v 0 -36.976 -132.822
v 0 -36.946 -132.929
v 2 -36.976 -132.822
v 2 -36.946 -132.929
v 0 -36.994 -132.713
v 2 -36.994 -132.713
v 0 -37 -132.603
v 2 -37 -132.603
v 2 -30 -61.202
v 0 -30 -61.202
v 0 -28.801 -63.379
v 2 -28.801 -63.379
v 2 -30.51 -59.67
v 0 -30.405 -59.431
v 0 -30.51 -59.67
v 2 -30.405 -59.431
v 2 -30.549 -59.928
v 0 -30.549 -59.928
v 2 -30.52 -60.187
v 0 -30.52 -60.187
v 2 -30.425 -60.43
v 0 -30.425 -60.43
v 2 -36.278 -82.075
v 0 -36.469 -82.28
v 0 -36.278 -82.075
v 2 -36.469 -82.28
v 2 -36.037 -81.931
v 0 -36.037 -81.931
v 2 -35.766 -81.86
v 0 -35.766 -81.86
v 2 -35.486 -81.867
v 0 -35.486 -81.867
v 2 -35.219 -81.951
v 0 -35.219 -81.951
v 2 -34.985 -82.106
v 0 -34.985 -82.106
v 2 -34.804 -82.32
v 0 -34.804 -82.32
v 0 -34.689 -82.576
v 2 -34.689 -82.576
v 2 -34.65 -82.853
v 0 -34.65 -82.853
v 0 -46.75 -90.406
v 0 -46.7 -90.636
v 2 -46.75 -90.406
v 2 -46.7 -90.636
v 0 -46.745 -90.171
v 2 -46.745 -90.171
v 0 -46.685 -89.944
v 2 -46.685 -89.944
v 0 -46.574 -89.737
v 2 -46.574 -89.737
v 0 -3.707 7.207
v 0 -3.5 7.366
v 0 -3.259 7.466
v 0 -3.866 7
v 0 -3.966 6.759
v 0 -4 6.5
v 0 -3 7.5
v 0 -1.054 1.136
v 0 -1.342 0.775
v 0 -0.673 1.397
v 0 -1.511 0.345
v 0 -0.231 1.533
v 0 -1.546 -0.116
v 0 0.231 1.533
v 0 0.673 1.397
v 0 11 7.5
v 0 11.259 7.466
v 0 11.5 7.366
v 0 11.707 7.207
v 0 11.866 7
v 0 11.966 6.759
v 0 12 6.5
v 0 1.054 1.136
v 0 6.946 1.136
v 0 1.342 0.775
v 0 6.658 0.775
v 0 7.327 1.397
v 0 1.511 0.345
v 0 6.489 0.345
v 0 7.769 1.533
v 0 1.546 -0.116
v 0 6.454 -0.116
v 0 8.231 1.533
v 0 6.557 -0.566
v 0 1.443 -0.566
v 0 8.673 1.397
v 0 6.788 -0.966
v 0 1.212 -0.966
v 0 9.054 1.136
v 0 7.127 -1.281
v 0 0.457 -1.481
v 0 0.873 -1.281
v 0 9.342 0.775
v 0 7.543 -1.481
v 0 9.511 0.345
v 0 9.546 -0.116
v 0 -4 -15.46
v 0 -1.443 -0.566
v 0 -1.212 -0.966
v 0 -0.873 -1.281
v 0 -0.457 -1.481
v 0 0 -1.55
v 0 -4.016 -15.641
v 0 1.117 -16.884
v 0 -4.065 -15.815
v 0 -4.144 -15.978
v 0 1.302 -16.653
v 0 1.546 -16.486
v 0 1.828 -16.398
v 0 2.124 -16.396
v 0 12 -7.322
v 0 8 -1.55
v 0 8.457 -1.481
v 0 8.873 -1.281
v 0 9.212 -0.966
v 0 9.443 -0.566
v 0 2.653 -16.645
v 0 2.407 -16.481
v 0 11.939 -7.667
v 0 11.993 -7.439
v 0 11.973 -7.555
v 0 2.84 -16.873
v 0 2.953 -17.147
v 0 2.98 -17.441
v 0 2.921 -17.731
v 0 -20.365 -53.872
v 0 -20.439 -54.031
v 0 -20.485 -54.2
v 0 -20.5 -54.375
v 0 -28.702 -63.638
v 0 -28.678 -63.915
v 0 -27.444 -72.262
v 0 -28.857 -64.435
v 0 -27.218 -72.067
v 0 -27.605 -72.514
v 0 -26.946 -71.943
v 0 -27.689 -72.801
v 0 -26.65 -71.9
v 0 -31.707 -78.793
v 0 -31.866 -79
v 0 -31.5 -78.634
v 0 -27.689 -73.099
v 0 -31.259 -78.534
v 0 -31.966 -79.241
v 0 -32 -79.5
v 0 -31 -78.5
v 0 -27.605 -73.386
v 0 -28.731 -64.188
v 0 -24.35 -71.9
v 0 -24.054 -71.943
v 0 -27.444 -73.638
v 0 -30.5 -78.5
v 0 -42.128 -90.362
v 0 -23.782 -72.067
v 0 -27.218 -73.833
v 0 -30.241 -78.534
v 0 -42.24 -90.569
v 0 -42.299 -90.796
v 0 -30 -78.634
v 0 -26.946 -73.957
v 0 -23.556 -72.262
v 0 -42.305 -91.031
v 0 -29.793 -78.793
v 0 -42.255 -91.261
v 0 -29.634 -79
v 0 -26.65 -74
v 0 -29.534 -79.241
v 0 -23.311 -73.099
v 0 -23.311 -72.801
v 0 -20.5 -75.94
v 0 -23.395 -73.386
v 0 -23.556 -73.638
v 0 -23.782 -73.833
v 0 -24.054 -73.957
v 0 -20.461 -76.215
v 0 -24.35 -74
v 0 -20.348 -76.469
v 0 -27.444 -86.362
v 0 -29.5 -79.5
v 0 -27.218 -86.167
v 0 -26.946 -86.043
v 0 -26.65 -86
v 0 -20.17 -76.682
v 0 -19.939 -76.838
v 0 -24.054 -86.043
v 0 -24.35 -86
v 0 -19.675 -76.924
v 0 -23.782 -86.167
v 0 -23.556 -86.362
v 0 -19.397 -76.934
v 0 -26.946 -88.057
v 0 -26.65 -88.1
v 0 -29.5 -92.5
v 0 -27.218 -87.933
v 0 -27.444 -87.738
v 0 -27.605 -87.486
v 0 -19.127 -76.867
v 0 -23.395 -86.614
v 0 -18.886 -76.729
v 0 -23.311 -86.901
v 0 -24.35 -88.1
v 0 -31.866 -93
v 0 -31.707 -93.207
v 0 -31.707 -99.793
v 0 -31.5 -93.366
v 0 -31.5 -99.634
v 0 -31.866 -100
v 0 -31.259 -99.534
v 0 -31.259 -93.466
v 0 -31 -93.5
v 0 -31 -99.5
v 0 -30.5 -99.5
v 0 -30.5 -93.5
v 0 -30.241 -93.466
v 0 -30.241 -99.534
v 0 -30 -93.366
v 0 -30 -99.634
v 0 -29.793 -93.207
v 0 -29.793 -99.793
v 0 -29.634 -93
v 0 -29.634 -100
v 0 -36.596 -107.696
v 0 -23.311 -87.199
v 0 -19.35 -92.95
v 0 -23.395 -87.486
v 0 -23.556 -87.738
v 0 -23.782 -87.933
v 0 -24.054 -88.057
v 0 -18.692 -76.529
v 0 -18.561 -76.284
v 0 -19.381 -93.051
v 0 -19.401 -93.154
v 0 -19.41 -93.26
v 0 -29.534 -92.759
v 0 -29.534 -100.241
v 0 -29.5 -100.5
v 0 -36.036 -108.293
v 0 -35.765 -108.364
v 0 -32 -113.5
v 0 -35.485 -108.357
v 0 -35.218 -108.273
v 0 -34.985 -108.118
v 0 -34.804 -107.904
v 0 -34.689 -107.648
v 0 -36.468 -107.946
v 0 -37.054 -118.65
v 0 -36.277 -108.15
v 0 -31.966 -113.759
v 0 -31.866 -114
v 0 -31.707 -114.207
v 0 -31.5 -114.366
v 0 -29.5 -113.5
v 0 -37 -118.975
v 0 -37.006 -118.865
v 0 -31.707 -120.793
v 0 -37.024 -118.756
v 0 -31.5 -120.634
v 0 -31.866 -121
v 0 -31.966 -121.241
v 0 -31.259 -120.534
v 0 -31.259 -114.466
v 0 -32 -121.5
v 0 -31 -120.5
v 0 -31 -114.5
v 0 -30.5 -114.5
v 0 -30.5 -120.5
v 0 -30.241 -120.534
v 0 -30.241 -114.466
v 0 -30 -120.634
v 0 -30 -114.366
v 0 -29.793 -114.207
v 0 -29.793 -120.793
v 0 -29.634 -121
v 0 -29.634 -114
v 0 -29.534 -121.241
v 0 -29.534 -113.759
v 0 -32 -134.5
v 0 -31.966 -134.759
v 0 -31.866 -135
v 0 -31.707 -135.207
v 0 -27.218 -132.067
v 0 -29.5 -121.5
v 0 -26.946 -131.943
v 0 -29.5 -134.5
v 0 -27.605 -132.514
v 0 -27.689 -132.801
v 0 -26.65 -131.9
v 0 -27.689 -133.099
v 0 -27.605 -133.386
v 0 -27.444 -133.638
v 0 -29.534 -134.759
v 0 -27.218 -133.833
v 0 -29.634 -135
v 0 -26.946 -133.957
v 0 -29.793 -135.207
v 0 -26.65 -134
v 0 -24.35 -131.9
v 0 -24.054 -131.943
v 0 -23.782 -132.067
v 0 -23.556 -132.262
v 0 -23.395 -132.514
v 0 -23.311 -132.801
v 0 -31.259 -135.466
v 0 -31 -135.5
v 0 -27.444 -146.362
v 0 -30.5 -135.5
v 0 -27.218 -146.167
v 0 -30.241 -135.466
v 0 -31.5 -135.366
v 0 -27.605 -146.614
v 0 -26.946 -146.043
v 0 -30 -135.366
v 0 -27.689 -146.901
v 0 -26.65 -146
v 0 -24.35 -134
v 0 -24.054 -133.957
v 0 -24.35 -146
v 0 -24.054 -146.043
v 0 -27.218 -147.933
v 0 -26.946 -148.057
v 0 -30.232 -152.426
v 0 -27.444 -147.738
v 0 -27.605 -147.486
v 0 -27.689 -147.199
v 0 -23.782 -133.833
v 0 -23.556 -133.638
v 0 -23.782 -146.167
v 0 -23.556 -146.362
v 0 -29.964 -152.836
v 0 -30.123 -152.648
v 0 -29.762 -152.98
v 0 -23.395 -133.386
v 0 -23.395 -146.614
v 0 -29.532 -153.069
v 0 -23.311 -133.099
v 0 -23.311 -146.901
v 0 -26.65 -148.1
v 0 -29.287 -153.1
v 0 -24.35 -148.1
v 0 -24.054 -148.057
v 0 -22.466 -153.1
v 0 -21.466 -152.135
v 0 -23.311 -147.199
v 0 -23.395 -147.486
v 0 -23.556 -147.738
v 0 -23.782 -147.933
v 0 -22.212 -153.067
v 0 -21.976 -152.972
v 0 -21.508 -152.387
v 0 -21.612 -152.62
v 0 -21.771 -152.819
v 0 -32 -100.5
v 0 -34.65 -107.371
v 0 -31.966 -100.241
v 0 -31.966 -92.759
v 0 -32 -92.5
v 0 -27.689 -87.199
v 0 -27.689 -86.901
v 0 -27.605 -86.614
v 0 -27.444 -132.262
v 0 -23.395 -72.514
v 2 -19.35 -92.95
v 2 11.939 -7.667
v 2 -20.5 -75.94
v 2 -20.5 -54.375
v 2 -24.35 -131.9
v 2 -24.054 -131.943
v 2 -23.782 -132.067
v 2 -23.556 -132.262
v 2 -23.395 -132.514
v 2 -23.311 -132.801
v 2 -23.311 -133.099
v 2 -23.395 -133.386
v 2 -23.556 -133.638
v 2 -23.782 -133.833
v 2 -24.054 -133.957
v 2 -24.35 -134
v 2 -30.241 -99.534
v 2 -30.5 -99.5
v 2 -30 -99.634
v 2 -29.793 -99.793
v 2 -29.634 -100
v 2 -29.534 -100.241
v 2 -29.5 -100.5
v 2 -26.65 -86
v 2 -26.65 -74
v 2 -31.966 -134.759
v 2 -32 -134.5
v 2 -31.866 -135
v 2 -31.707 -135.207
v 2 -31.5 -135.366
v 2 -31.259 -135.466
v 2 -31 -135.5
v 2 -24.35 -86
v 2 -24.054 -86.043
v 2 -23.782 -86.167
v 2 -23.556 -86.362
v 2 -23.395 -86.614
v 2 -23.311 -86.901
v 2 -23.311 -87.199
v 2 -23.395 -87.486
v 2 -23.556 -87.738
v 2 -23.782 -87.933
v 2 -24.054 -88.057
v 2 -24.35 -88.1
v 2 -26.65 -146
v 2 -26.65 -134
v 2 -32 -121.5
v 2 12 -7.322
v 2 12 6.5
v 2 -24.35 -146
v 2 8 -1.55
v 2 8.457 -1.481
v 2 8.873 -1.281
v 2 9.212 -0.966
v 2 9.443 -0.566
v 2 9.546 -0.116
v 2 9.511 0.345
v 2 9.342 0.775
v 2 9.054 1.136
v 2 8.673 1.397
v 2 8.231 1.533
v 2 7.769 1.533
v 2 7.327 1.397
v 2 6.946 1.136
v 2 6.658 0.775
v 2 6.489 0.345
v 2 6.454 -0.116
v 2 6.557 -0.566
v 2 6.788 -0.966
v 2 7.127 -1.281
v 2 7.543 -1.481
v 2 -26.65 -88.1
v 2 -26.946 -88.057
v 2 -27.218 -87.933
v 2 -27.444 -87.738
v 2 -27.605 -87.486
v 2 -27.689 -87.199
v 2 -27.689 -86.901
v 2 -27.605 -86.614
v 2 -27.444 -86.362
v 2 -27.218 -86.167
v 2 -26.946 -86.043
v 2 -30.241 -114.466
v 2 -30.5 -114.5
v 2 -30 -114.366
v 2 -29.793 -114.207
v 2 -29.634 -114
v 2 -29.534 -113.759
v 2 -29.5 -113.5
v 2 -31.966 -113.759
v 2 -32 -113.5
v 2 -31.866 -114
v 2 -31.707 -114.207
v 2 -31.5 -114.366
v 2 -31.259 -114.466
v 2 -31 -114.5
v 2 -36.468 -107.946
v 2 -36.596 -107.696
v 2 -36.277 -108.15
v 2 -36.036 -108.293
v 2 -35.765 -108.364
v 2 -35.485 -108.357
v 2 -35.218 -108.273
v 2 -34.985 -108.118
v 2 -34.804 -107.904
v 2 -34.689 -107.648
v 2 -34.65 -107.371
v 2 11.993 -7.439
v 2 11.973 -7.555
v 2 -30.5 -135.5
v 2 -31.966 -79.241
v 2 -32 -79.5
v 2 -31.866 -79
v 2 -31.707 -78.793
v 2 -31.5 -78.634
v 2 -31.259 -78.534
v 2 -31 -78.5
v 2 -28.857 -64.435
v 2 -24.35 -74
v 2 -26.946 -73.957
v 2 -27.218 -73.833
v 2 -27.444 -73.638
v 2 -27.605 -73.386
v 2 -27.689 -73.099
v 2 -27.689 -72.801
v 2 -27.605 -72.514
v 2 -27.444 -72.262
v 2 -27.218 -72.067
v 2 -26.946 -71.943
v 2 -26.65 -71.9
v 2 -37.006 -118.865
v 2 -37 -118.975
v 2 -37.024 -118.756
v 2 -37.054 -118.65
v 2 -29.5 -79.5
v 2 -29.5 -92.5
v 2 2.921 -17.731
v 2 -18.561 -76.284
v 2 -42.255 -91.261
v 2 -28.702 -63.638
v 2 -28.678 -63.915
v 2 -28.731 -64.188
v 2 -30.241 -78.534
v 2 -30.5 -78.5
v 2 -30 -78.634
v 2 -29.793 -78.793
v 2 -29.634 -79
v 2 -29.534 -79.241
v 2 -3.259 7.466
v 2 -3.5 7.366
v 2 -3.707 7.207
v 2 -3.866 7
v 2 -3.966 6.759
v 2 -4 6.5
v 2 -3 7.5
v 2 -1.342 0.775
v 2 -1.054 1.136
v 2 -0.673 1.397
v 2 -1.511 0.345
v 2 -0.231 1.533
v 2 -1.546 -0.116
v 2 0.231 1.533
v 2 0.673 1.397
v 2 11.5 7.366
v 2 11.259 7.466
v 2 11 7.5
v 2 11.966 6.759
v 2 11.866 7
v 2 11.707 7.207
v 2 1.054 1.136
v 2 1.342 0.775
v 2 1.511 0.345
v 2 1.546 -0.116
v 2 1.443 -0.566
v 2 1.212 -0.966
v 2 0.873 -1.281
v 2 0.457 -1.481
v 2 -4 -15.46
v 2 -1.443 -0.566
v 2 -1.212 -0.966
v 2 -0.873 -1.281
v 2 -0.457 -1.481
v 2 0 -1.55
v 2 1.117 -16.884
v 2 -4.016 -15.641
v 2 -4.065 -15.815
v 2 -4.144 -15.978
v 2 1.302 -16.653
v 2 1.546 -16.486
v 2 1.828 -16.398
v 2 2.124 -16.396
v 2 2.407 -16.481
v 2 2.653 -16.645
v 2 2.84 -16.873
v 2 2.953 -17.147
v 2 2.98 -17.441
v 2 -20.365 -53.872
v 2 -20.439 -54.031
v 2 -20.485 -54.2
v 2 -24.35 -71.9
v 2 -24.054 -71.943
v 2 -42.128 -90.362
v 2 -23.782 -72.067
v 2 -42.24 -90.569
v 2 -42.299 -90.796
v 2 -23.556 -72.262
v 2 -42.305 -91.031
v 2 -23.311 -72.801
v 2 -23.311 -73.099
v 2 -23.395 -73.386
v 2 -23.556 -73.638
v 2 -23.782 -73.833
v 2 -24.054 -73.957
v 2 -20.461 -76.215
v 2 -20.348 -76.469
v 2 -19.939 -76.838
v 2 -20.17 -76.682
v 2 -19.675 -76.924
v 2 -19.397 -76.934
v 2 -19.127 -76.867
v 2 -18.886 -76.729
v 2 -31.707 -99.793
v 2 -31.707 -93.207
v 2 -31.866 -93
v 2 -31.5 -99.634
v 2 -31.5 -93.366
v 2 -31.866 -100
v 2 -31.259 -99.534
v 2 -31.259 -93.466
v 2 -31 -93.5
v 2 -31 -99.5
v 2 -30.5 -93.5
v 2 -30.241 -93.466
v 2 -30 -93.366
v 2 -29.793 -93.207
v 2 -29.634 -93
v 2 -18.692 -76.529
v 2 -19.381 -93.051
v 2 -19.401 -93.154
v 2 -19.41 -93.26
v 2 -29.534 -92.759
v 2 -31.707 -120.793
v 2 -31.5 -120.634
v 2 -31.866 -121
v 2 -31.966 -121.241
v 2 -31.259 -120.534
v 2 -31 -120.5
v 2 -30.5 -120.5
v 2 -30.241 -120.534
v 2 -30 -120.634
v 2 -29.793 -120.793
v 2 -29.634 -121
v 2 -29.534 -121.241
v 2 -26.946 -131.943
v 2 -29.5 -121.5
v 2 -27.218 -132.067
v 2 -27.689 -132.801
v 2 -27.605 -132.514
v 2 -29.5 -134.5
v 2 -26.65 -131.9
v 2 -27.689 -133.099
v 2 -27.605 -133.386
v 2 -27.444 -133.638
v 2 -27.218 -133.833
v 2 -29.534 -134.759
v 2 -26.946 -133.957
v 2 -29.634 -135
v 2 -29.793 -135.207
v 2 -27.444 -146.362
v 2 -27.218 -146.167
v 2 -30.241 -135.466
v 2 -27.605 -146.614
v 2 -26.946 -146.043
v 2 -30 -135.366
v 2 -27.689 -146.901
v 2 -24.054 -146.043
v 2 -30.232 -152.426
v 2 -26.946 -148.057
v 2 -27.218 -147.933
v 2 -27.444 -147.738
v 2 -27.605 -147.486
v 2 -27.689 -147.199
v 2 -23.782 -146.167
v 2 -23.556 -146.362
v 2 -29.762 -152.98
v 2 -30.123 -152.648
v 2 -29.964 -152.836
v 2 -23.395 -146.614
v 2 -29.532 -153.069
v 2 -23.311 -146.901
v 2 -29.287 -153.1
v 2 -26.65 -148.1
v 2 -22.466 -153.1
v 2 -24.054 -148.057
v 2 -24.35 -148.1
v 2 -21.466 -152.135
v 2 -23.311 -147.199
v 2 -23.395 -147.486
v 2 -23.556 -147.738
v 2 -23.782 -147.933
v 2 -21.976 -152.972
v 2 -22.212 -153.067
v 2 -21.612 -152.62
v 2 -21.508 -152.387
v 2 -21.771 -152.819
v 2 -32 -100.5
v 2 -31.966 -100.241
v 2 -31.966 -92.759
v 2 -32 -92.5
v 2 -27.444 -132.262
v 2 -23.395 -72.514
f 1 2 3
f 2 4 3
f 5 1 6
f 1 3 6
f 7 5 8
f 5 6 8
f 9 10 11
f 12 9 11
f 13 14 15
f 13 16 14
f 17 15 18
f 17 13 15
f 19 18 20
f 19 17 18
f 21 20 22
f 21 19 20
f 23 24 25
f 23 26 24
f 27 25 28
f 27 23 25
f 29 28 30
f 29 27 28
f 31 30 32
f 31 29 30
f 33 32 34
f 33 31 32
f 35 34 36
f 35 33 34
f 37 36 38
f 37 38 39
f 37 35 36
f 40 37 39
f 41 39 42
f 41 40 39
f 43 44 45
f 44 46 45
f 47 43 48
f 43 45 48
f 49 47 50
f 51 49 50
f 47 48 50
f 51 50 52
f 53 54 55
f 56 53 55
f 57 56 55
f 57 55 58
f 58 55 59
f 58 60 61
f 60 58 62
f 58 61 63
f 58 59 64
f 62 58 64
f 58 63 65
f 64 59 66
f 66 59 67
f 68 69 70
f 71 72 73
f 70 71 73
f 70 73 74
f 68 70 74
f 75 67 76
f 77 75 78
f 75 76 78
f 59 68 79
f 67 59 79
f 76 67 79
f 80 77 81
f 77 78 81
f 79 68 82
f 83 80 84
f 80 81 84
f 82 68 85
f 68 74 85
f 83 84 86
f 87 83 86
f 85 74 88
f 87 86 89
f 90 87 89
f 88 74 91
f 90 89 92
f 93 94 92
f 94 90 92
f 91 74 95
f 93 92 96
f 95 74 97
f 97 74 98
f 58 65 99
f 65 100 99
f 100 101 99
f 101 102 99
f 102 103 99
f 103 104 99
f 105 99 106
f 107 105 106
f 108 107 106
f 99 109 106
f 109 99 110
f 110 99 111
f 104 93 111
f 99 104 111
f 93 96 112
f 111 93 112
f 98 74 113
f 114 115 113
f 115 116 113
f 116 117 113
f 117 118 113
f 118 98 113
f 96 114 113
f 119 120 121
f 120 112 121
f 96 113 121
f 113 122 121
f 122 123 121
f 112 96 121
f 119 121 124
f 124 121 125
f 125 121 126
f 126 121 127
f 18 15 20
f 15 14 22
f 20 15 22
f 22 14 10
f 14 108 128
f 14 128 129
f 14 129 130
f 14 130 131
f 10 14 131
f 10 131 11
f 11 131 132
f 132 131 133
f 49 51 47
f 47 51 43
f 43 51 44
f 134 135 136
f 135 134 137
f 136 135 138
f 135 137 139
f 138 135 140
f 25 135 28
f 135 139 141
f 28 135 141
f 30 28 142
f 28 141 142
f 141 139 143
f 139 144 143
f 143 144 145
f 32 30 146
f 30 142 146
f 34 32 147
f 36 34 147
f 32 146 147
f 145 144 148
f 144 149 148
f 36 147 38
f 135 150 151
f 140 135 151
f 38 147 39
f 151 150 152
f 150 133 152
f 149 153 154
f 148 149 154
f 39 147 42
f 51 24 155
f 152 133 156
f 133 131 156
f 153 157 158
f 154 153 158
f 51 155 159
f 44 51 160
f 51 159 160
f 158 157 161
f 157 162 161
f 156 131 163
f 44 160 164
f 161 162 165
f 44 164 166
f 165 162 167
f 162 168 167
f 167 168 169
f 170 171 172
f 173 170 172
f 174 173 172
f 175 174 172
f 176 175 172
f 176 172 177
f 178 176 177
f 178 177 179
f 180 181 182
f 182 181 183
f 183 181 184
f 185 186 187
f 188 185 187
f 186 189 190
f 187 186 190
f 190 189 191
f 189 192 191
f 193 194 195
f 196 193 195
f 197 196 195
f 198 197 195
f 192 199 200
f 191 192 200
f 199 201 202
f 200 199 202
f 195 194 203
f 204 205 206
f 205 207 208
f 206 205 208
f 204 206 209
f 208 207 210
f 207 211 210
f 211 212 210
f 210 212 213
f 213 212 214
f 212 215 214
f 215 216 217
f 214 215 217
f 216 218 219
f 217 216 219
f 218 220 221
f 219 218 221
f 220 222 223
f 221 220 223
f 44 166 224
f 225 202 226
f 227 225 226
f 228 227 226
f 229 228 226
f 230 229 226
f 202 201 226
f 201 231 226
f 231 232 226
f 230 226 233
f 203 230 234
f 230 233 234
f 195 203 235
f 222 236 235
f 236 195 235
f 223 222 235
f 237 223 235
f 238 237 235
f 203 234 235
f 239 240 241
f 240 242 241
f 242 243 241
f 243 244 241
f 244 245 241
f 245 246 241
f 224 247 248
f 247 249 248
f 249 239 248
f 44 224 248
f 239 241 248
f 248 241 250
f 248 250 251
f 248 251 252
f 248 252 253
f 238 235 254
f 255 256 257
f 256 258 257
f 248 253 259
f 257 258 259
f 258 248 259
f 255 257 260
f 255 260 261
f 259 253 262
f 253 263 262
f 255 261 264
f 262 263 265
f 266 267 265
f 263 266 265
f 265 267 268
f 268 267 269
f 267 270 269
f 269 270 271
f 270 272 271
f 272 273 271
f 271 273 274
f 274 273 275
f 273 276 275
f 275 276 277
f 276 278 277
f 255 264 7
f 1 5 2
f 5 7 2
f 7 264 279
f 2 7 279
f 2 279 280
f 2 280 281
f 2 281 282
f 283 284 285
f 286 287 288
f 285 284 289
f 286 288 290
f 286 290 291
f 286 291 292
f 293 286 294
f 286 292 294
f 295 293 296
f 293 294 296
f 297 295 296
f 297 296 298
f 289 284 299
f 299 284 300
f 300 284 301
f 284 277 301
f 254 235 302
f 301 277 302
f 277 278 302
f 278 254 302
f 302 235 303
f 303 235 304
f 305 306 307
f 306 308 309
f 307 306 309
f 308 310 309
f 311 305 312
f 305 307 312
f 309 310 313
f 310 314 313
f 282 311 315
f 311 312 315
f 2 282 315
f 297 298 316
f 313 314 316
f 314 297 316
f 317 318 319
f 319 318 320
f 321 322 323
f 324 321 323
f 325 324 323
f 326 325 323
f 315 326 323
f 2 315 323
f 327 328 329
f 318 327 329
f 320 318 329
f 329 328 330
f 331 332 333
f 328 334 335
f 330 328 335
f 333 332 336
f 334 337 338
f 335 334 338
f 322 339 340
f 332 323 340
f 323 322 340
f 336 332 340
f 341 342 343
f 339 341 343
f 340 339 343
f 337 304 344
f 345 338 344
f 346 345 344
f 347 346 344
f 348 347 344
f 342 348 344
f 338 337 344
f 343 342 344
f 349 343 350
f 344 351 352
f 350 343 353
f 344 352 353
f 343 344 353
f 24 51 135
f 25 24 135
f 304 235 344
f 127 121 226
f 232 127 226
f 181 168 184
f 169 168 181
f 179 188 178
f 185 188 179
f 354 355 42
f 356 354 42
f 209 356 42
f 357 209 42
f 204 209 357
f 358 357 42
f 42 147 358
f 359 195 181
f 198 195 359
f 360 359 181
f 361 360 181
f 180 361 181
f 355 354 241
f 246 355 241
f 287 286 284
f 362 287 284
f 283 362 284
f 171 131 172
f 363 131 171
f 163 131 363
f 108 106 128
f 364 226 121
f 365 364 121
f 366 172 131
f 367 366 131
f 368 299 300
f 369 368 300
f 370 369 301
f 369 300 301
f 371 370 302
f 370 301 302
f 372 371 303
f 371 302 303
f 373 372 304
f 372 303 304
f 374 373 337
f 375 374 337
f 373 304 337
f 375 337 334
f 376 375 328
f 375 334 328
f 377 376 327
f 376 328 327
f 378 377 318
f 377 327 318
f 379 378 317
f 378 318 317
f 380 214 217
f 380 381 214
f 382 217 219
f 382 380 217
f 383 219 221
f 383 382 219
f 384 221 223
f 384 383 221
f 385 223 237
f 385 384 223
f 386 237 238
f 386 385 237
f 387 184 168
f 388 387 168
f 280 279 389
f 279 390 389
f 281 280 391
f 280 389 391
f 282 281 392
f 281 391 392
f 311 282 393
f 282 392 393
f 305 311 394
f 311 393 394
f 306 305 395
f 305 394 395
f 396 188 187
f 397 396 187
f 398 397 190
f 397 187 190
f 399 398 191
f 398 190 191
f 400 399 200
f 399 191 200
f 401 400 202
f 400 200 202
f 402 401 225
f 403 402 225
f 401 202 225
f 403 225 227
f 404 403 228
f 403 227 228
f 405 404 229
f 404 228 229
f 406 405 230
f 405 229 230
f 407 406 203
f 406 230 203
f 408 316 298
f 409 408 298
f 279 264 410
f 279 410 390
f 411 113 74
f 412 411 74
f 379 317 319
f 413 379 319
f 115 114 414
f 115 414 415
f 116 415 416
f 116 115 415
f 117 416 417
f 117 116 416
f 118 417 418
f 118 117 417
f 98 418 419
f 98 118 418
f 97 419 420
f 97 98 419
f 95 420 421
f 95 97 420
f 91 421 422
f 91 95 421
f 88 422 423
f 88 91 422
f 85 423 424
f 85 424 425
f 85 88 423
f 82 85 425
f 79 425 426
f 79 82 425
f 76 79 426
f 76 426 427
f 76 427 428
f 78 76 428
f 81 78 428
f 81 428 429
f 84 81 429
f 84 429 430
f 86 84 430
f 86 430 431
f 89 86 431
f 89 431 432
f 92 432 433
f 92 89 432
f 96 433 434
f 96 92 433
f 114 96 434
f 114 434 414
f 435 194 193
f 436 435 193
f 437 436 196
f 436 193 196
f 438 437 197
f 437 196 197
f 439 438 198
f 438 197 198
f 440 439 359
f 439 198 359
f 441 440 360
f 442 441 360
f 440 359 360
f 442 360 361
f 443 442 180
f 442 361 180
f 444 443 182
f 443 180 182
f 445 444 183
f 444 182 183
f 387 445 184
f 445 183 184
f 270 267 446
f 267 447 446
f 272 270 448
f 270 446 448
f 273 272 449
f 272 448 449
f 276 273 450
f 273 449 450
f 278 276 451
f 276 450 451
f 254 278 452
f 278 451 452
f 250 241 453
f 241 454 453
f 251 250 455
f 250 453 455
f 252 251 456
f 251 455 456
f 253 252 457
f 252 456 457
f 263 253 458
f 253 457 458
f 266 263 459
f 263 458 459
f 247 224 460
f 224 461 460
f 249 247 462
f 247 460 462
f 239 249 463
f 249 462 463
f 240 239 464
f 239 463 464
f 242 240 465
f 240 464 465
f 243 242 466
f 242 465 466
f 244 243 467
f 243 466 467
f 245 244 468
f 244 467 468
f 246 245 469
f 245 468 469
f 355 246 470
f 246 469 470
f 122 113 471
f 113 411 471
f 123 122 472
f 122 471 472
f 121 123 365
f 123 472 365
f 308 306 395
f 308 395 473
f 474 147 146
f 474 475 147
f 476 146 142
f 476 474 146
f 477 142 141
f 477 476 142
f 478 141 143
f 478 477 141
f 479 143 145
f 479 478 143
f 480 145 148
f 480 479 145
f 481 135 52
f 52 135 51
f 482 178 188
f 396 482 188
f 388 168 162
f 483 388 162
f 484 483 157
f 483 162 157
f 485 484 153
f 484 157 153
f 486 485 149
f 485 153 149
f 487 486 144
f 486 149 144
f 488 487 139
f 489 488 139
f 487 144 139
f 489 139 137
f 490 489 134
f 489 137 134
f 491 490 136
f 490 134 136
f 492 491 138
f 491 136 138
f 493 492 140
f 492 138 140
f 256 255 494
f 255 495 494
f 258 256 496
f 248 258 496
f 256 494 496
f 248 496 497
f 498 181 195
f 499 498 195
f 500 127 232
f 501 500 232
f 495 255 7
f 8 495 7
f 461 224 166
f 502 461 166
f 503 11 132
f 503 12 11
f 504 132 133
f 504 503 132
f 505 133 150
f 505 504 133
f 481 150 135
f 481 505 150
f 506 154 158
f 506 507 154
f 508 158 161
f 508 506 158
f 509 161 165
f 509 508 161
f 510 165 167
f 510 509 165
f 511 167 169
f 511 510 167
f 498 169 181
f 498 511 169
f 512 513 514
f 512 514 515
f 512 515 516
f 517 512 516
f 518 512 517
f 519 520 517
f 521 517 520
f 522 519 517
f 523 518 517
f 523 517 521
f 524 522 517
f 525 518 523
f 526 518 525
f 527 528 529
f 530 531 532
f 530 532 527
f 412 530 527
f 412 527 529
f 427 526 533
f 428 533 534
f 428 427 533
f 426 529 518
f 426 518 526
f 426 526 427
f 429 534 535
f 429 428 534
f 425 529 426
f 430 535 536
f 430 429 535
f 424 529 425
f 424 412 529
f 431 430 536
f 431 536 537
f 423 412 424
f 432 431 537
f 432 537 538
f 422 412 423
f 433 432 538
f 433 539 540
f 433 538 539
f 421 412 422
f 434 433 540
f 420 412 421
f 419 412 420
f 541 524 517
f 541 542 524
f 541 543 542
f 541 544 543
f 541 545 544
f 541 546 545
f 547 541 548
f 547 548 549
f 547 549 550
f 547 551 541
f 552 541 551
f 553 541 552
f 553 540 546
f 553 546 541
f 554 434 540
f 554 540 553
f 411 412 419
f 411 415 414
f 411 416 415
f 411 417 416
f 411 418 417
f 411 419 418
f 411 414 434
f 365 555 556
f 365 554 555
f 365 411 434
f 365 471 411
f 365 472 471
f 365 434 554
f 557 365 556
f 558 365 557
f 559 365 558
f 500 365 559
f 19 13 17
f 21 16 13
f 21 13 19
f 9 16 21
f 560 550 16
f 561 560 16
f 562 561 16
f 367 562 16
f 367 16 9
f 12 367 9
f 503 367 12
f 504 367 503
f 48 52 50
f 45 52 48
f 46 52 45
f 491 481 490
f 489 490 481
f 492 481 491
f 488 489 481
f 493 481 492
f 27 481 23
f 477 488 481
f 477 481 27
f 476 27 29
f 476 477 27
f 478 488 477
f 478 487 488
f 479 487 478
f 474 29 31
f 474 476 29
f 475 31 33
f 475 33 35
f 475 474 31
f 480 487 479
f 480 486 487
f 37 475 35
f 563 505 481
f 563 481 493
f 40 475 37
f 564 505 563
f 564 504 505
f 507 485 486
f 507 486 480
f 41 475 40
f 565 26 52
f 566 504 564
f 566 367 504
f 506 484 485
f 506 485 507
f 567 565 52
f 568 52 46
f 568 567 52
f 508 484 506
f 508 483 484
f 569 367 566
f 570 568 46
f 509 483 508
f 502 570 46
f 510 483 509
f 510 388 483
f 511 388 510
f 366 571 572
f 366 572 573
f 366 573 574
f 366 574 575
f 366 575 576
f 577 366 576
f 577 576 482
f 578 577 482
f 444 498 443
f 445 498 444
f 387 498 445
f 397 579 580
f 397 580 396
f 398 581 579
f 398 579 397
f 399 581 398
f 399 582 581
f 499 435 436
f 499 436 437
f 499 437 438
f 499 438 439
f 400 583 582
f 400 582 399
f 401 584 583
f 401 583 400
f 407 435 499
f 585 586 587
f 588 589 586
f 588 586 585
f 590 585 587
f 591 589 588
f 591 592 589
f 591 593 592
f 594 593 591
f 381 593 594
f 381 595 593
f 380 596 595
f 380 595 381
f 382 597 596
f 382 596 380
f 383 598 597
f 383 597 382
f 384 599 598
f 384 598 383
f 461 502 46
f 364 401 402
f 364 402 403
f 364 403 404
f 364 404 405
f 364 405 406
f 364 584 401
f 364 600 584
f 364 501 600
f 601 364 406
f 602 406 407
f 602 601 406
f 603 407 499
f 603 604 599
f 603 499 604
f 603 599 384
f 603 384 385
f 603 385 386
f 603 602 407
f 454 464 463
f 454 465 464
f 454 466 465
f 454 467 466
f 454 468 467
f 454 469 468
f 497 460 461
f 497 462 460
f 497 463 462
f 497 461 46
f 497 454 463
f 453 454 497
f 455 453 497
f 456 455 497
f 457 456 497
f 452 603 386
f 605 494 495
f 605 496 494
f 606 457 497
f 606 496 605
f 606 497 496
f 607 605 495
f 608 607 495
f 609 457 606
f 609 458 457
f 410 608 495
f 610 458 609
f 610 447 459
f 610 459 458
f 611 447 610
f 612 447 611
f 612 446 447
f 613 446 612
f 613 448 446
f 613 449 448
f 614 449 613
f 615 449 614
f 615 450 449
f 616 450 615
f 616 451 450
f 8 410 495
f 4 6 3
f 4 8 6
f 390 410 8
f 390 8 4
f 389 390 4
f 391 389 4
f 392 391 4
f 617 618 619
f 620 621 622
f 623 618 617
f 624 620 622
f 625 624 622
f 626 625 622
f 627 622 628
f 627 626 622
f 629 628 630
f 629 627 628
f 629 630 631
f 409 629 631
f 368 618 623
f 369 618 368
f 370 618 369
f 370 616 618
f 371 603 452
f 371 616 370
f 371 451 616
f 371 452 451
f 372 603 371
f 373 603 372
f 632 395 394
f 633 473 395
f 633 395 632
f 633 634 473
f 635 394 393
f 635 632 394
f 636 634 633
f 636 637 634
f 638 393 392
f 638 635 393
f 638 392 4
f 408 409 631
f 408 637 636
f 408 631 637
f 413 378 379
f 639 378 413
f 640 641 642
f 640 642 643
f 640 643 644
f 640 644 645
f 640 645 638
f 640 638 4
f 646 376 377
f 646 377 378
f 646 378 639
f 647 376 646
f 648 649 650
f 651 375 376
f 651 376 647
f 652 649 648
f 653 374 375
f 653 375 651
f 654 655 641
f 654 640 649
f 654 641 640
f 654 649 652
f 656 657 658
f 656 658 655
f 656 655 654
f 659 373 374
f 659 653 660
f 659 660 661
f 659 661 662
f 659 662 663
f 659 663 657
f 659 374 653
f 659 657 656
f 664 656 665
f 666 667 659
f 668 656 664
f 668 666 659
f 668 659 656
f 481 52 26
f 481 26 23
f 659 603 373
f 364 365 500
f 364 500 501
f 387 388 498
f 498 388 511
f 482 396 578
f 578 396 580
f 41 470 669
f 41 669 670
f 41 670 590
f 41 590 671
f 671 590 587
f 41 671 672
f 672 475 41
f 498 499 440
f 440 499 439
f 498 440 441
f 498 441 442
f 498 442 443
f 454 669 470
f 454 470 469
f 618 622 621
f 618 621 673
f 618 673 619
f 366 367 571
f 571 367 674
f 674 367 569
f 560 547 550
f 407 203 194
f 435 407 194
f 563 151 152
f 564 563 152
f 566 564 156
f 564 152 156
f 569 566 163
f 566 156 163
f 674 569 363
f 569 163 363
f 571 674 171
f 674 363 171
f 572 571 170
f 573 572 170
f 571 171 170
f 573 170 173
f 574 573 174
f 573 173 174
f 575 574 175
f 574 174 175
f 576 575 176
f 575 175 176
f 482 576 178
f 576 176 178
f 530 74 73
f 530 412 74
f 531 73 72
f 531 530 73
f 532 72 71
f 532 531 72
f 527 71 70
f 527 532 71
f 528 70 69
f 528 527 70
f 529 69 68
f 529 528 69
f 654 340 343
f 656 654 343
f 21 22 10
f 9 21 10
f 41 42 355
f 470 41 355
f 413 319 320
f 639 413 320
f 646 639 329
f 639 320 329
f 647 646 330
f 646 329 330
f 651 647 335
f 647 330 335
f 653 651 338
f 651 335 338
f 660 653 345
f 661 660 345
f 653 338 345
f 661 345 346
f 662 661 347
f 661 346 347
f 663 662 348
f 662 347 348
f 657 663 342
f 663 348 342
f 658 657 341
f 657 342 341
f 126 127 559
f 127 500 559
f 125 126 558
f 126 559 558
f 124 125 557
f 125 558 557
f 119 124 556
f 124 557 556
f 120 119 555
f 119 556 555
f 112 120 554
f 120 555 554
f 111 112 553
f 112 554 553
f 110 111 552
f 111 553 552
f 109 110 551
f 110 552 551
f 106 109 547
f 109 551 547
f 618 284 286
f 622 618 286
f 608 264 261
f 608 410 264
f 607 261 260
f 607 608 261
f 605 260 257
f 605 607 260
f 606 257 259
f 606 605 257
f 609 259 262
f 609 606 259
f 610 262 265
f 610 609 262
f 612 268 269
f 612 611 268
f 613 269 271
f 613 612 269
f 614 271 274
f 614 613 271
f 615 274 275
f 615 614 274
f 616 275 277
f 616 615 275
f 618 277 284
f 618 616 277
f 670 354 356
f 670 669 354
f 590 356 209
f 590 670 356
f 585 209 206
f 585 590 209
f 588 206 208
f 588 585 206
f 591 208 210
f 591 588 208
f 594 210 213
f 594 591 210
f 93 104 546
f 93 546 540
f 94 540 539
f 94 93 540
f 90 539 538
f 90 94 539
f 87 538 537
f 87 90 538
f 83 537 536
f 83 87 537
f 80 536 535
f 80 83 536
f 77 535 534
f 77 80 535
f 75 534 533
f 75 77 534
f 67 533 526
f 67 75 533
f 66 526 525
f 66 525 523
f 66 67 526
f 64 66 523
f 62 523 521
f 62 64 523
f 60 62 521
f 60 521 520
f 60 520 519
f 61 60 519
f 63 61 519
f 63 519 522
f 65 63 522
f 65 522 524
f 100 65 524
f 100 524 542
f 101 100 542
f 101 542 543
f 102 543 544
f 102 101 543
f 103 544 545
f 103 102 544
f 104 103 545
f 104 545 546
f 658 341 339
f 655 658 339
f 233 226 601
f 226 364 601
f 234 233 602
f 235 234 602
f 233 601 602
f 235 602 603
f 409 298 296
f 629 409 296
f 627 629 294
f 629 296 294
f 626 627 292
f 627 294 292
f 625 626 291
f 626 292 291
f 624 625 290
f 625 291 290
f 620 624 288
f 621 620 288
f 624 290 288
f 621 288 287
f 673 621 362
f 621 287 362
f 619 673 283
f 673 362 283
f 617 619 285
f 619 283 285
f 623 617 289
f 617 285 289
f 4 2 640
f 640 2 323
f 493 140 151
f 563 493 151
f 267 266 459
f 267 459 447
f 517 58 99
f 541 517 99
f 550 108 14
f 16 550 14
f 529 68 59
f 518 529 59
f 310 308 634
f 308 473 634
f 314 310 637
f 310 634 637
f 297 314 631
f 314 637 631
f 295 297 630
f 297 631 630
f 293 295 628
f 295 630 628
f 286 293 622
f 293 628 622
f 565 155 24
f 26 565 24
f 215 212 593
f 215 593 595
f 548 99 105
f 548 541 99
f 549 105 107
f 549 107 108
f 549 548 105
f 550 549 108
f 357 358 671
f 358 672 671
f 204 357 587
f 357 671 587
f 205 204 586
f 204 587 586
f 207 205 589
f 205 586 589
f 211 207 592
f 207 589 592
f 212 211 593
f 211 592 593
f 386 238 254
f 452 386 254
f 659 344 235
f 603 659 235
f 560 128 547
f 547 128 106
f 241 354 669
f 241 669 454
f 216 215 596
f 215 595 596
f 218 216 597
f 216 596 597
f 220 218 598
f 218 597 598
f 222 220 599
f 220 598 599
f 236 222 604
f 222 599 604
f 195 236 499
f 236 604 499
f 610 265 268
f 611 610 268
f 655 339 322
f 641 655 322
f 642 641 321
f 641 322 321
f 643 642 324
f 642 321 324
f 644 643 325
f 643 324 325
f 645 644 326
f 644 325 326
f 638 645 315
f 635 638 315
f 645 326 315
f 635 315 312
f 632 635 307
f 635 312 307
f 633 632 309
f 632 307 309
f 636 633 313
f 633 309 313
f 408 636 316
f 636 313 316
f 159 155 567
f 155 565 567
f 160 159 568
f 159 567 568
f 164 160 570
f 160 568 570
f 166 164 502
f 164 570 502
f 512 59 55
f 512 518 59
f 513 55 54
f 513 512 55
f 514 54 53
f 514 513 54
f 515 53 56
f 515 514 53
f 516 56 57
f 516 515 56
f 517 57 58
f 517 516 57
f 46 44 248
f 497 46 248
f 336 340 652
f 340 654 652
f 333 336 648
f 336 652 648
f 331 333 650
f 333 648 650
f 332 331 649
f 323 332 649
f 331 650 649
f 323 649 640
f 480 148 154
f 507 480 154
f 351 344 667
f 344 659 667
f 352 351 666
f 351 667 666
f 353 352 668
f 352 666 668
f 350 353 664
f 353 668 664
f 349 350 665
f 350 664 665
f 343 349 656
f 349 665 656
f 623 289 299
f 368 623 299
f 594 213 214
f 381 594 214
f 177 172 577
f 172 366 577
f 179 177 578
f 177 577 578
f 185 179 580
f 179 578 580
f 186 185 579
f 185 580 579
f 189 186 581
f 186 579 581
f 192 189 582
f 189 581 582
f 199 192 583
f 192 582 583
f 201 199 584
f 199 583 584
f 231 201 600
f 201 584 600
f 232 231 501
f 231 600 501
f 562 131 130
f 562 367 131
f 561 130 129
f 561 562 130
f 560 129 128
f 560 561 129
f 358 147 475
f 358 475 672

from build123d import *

# Parameters (mm, degrees)
SKETCH_1_W      = 15
SKETCH_1_H      = 2.5
SKETCH_1_R      = 1.55
EXTRUDE_1_DEPTH = 2
FILLET_1_R      = 1


with BuildPart() as part:
    # 草图1 → 凸台-拉伸1 (new body)
    with BuildSketch(Plane(origin=(0, 0, 0), x_dir=(0, 0, -1), z_dir=(1, 0, 0))):
        Polygon((7.5, 12), (-7.5, 12), (-7.5, -4), (15.739132695, -4), (59.924651317, -30.703841765), (61.202132807, -30), (63.924651317, -28.5), (90.154353452, -46.86623516), (118.807980924, -37), (132.770523856, -37), (153.1, -30), (153.1, -21.5), (93.1, -19.40475383), align=None)
        with Locations((128, -30.75)):
            Rectangle(SKETCH_1_W, SKETCH_1_H, mode=Mode.SUBTRACT)
        with Locations((107, -30.75)):
            Rectangle(SKETCH_1_W, SKETCH_1_H, mode=Mode.SUBTRACT)
        with Locations((86, -30.75)):
            Rectangle(SKETCH_1_W, SKETCH_1_H, mode=Mode.SUBTRACT)
        with BuildLine():
            Line((86, -26.65), (74, -26.65))
            ThreePointArc((74, -26.65), (72.95, -27.7), (71.9, -26.65))
            Line((71.9, -26.65), (71.9, -24.35))
            ThreePointArc((71.9, -24.35), (72.95, -23.3), (74, -24.35))
            Line((74, -24.35), (86, -24.35))
            ThreePointArc((86, -24.35), (87.05, -23.3), (88.1, -24.35))
            Line((88.1, -24.35), (88.1, -26.65))
            ThreePointArc((88.1, -26.65), (87.05, -27.7), (86, -26.65))
        make_face(mode=Mode.SUBTRACT)
        with BuildLine():
            Line((146, -26.65), (134, -26.65))
            ThreePointArc((134, -26.65), (132.95, -27.7), (131.9, -26.65))
            Line((131.9, -26.65), (131.9, -24.35))
            ThreePointArc((131.9, -24.35), (132.95, -23.3), (134, -24.35))
            Line((134, -24.35), (146, -24.35))
            ThreePointArc((146, -24.35), (147.05, -23.3), (148.1, -24.35))
            Line((148.1, -24.35), (148.1, -26.65))
            ThreePointArc((148.1, -26.65), (147.05, -27.7), (146, -26.65))
        make_face(mode=Mode.SUBTRACT)
        Polygon((54.105215944, -20.5), (7, 6.857560085), (81.568555955, -20.5), align=None, mode=Mode.SUBTRACT)
        Circle(SKETCH_1_R, mode=Mode.SUBTRACT)
        with Locations((0, 8)):
            Circle(SKETCH_1_R, mode=Mode.SUBTRACT)
        Polygon((79.681548741, -34.65), (113.34666254, -34.65), (90.779143943, -42.420619816), align=None, mode=Mode.SUBTRACT)
    extrude(amount=EXTRUDE_1_DEPTH)

    # 圆角1
    fillet_1_edges = [part.edges().sort_by_distance(p)[0] for p in [
        (1, -32, -135.5),
        (1, -29.5, -135.5),
        (1, -29.5, -120.5),
        (1, -32, -120.5),
        (1, -32, -114.5),
        (1, -29.5, -114.5),
        (1, -29.5, -99.5),
        (1, -32, -99.5),
        (1, -32, -93.5),
        (1, -29.5, -93.5),
        (1, -29.5, -78.5),
        (1, -32, -78.5),
        (1, -34.65, -113.34666254),
        (1, -34.65, -79.681548741),
        (1, -42.420619816, -90.779143943),
        (1, 6.857560085, -7),
        (1, -20.5, -54.105215944),
        (1, -20.5, -81.568555955),
        (1, -46.86623516, -90.154353452),
        (1, -28.5, -63.924651317),
        (1, -30.703841765, -59.924651317),
        (1, -4, -15.739132695),
        (1, -4, 7.5),
        (1, 12, 7.5),
        (1, 12, -7.5),
        (1, -19.40475383, -93.1),
        (1, -21.5, -153.1),
        (1, -30, -153.1),
        (1, -37, -132.770523856),
        (1, -37, -118.807980924),
    ]]
    fillet(fillet_1_edges, radius=FILLET_1_R)


solid = part.part
